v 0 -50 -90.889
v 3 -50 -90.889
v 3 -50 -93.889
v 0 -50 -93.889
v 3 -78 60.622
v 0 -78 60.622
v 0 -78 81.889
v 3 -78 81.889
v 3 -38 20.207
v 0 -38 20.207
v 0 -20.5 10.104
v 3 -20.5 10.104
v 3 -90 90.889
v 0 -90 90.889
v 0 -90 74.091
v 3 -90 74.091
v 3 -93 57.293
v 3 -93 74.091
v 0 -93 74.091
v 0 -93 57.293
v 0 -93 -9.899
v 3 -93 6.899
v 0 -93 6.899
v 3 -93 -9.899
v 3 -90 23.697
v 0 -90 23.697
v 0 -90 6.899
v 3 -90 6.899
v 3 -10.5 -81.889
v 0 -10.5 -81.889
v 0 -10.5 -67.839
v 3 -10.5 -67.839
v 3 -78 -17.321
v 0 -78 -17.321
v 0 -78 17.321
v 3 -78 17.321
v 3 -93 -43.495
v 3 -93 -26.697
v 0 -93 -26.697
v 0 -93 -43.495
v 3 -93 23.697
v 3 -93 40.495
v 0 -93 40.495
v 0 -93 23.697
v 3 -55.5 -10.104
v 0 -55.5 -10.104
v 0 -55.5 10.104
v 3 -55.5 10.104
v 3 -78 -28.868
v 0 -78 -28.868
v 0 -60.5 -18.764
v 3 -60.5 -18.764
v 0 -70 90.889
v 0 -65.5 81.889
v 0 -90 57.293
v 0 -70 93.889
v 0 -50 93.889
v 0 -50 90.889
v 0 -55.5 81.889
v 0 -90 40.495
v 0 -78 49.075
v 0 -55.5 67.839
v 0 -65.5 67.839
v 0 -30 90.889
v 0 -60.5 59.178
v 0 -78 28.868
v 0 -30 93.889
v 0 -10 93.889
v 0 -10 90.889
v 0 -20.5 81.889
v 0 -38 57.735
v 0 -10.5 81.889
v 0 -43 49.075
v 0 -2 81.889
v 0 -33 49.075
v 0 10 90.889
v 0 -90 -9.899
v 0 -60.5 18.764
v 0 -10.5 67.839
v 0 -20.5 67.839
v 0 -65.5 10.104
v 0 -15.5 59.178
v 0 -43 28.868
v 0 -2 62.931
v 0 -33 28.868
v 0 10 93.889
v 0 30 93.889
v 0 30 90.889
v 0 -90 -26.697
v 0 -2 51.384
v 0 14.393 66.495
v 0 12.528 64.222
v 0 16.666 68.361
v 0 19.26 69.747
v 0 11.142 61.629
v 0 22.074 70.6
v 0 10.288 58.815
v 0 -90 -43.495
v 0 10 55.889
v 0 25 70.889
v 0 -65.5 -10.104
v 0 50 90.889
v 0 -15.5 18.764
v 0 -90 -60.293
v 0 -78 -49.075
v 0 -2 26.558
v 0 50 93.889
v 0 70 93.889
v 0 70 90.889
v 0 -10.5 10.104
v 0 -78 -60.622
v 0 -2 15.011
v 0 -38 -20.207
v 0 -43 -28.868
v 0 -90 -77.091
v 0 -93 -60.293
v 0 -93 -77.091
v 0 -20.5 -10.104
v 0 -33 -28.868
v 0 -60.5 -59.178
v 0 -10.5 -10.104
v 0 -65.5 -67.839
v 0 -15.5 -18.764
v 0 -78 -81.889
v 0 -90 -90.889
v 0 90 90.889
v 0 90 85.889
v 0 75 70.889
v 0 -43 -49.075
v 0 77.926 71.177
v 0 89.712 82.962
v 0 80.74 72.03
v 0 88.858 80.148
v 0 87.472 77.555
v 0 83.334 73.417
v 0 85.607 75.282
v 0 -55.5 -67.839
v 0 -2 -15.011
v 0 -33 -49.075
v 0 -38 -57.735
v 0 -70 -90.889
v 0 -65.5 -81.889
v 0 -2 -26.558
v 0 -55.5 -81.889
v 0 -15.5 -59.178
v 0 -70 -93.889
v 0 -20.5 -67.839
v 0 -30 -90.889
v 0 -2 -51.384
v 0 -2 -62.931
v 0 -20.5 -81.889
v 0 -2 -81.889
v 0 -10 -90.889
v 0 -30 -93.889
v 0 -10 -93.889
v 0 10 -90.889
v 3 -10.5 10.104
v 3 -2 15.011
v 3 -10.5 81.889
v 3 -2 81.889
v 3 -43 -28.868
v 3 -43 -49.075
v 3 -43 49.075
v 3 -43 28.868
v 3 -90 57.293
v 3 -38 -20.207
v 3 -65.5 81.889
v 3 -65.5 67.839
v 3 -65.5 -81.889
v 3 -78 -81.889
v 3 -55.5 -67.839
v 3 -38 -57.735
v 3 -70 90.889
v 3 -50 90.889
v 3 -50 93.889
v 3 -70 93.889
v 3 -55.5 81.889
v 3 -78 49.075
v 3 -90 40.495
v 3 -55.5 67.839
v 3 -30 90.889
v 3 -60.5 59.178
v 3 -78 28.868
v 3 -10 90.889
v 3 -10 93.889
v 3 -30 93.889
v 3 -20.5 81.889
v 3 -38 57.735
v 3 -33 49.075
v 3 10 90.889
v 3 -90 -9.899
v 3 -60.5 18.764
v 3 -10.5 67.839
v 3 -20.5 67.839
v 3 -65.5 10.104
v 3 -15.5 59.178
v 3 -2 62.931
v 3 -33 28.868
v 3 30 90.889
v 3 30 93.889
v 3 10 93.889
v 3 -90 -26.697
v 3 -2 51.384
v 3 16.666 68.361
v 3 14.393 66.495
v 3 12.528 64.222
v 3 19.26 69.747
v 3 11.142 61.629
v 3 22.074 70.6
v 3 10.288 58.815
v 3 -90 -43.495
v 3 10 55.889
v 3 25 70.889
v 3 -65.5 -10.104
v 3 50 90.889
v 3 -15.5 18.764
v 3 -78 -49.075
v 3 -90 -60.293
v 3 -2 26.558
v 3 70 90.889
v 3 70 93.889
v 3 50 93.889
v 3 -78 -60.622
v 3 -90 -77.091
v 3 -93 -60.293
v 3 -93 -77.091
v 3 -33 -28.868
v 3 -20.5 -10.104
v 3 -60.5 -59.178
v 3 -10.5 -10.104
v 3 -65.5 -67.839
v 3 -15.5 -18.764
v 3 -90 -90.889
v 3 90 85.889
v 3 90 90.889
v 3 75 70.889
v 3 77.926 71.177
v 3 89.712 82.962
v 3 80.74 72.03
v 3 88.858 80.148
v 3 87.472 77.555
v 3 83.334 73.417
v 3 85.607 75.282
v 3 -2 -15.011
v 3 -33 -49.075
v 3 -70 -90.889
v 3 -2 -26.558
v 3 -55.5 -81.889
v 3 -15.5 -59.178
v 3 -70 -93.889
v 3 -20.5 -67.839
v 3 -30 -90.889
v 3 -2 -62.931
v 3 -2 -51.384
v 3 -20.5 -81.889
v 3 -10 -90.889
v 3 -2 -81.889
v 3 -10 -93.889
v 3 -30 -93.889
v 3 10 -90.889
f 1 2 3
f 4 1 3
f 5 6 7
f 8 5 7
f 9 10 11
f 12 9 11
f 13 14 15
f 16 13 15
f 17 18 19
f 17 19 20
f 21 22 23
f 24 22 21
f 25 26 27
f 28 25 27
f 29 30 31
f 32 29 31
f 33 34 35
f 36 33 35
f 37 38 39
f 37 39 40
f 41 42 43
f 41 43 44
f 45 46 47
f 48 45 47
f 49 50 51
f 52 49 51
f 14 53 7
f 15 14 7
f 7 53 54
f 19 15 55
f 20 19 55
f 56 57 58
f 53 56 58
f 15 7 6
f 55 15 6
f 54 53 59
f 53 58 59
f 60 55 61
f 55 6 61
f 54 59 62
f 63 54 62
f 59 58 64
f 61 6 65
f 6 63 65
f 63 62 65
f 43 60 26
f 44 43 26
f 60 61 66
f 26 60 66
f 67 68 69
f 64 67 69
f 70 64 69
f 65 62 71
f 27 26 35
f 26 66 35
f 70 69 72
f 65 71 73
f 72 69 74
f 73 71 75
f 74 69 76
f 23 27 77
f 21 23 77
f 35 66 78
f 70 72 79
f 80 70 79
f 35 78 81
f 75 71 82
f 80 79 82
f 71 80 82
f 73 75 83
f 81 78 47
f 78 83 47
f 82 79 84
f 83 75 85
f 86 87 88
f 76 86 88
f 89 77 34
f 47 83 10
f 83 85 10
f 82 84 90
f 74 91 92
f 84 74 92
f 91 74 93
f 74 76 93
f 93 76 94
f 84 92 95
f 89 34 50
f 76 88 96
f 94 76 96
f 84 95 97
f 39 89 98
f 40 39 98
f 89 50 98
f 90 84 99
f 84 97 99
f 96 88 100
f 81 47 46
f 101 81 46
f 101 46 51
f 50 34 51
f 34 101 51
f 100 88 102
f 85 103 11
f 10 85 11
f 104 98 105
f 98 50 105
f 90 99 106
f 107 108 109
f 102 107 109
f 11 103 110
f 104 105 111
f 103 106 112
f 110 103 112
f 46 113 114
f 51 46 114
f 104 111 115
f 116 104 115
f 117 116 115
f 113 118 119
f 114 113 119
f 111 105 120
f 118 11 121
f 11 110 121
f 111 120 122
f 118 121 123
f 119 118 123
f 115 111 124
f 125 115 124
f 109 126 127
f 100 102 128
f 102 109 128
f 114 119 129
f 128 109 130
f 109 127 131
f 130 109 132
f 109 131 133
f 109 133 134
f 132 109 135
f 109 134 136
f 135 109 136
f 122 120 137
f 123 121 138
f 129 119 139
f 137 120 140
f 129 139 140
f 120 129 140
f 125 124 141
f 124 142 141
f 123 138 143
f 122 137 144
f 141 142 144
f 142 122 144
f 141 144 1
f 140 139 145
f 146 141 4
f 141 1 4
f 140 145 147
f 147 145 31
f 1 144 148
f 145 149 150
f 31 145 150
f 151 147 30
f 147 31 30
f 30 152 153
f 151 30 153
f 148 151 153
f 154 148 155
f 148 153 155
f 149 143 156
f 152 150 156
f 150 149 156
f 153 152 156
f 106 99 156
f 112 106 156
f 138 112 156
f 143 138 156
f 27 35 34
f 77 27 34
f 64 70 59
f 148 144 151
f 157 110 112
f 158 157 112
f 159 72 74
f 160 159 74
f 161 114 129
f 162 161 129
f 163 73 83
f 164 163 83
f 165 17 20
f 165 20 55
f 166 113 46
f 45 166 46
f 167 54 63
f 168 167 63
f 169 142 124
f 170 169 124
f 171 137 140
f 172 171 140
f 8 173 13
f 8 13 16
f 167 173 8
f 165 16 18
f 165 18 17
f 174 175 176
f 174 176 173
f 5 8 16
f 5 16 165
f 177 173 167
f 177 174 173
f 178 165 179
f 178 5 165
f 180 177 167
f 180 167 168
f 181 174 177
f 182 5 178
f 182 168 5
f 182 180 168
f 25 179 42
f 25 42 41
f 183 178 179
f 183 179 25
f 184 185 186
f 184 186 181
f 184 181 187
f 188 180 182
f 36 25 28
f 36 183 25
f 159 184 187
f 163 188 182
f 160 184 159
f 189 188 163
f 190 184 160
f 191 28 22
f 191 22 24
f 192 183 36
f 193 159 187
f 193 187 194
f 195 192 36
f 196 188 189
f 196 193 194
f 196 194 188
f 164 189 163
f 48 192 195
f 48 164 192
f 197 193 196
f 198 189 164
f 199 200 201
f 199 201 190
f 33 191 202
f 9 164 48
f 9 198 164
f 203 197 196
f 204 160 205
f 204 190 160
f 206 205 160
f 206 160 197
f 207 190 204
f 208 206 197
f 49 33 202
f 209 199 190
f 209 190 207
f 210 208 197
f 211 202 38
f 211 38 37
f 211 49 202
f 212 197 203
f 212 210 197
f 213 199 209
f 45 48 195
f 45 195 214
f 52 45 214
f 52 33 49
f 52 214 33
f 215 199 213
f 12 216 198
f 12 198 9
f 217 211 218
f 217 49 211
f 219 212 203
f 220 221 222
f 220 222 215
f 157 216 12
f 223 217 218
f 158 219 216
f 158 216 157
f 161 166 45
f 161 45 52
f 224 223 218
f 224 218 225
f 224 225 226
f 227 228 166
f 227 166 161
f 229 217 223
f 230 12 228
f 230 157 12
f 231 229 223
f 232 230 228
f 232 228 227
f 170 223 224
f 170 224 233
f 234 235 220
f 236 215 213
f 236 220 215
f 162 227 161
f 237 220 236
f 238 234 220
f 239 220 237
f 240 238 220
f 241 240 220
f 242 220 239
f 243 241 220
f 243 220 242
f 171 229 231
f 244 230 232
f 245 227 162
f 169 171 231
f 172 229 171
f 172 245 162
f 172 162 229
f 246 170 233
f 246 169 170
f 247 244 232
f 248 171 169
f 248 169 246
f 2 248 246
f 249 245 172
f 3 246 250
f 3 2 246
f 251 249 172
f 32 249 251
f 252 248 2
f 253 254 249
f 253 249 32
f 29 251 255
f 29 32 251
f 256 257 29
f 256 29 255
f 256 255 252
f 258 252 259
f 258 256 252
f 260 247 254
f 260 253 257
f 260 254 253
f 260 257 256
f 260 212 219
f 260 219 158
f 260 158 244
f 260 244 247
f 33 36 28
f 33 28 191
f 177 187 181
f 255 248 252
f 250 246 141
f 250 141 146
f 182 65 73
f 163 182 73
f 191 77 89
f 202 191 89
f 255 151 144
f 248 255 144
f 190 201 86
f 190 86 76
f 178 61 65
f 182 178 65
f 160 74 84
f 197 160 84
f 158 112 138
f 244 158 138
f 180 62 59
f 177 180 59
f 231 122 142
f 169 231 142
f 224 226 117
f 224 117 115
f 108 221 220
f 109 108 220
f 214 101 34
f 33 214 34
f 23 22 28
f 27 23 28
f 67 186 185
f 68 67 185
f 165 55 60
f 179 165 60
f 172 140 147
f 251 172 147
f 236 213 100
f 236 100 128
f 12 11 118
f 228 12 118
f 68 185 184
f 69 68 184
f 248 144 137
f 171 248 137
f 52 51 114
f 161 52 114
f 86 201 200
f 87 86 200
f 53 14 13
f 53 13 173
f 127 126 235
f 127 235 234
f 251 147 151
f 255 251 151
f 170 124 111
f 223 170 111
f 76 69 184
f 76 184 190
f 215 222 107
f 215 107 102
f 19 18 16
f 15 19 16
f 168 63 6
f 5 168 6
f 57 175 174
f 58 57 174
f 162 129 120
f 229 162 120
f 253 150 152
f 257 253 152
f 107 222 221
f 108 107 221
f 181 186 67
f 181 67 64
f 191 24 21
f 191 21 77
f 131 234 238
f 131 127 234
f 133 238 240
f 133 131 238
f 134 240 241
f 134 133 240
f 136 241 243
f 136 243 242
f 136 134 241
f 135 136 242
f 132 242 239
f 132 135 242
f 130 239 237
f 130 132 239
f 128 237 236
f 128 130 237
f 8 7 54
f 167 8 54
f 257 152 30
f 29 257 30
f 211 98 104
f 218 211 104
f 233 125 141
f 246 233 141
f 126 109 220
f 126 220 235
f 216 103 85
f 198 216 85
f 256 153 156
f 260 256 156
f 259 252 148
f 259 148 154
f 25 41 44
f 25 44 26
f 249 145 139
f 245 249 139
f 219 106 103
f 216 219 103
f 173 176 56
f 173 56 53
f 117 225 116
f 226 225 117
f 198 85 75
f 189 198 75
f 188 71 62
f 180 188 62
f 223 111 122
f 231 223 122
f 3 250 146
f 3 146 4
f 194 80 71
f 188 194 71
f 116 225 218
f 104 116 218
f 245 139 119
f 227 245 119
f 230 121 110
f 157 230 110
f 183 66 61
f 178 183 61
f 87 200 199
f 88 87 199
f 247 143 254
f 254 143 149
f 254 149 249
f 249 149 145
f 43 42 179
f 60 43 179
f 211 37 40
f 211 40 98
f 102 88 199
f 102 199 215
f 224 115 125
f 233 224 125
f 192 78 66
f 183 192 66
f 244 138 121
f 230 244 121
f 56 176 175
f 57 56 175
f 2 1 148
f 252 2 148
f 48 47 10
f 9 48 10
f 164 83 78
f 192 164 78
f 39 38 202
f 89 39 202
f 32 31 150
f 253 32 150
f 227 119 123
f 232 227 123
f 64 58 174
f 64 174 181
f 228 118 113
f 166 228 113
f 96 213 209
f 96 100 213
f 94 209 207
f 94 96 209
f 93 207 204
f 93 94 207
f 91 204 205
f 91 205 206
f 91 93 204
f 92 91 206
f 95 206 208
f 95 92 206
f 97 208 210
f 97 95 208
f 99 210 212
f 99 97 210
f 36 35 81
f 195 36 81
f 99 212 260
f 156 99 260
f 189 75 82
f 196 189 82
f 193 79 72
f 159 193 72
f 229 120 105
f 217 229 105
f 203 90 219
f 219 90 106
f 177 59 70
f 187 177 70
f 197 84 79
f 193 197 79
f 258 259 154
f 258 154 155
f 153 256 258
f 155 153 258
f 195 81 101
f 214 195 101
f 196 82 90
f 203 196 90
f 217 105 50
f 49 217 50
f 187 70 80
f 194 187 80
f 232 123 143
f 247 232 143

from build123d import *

# Parameters (mm, degrees)
SKETCH1_W               = 181.7773
SKETCH1_H               = 180
BOSS_EXTRUDE1_DEPTH     = 3
SKETCH2_W               = 16.797936363
SKETCH2_H               = 3
SKETCH2_W_2             = 16.797936364
SKETCH2_W_3             = 3
SKETCH2_H_2             = 20
BOSS_EXTRUDE2_DEPTH     = 3
SKETCH3_W               = 164.7773
SKETCH3_H               = 80
CUT_EXTRUDE1_DEPTH      = 1
CUT_EXTRUDE1_DEPTH_BACK = 4
FILLET1_R               = 15
CUT_EXTRUDE2_DEPTH      = 10


with BuildPart() as part:
    # Sketch1 → Boss-Extrude1 (new body)
    with BuildSketch(Plane(origin=(0, 0, 0), x_dir=(0, 0, -1), z_dir=(1, 0, 0))):
        Rectangle(SKETCH1_W, SKETCH1_H)
    extrude(amount=BOSS_EXTRUDE1_DEPTH)

    # Sketch2 → Boss-Extrude2 (add)
    with BuildSketch(Plane(origin=(3, 0, 0), x_dir=(0, 0, -1), z_dir=(1, 0, 0))):
        with Locations((-65.691745455, -91.5)):
            Rectangle(SKETCH2_W, SKETCH2_H)
        with Locations((-32.095872727, -91.5)):
            Rectangle(SKETCH2_W_2, SKETCH2_H)
        with Locations((1.5, -91.5)):
            Rectangle(SKETCH2_W_2, SKETCH2_H)
        with Locations((92.38865, -60)):
            Rectangle(SKETCH2_W_3, SKETCH2_H_2)
        with Locations((92.38865, -20)):
            Rectangle(SKETCH2_W_3, SKETCH2_H_2)
        with Locations((92.38865, 20)):
            Rectangle(SKETCH2_W_3, SKETCH2_H_2)
        with Locations((92.38865, 60)):
            Rectangle(SKETCH2_W_3, SKETCH2_H_2)
        with Locations((-92.38865, -60)):
            Rectangle(SKETCH2_W_3, SKETCH2_H_2)
        with Locations((-92.38865, -20)):
            Rectangle(SKETCH2_W_3, SKETCH2_H_2)
        with Locations((-92.38865, 20)):
            Rectangle(SKETCH2_W_3, SKETCH2_H_2)
        with Locations((-92.38865, 60)):
            Rectangle(SKETCH2_W_3, SKETCH2_H_2)
        with Locations((35.095872727, -91.5)):
            Rectangle(SKETCH2_W_2, SKETCH2_H)
        with Locations((68.691745455, -91.5)):
            Rectangle(SKETCH2_W, SKETCH2_H)
    extrude(amount=-BOSS_EXTRUDE2_DEPTH)

    # Sketch3 → Cut-Extrude1 (cut, two sides)
    with BuildSketch(Plane(origin=(3, 0, 0), x_dir=(0, 0, -1), z_dir=(1, 0, 0))) as cut_extrude1_sk:
        with Locations((11.5, 50)):
            Rectangle(SKETCH3_W, SKETCH3_H)
    extrude(amount=CUT_EXTRUDE1_DEPTH, mode=Mode.SUBTRACT)
    extrude(cut_extrude1_sk.sketch, amount=-CUT_EXTRUDE1_DEPTH_BACK, mode=Mode.SUBTRACT)

    # Fillet1
    fillet1_edges = [part.edges().sort_by_distance(p)[0] for p in [
        (1.5, 10, 70.88865),
        (1.5, 90, 70.88865),
    ]]
    fillet(fillet1_edges, radius=FILLET1_R)

    # Sketch4 → Cut-Extrude2 (cut)
    with BuildSketch(Plane.ZY):
        Polygon((-67.83865663, -65.5), (-81.88865, -65.5), (-81.88865, -78), (-60.621778265, -78), align=None)
        Polygon((-49.074772881, -43), (-59.178402592, -60.5), (-49.074772881, -78), (-28.867513459, -78), (-18.763883749, -60.5), (-28.867513459, -43), align=None)
        Polygon((-10.103629711, -65.5), (-17.320508076, -78), (17.320508076, -78), (10.103629711, -65.5), align=None)
        Polygon((28.867513459, -43), (18.763883749, -60.5), (28.867513459, -78), (49.074772881, -78), (59.178402592, -60.5), (49.074772881, -43), align=None)
        Polygon((81.88865, -78), (81.88865, -65.5), (67.83865663, -65.5), (60.621778265, -78), align=None)
        Polygon((81.88865, -55.5), (81.88865, -20.5), (67.83865663, -20.5), (57.735026919, -38), (67.83865663, -55.5), align=None)
        Polygon((51.384173958, -2), (26.558112383, -2), (18.763883749, -15.5), (28.867513459, -33), (49.074772881, -33), (59.178402592, -15.5), align=None)
        Polygon((81.88865, -10.5), (81.88865, -2), (62.931179342, -2), (67.83865663, -10.5), align=None)
        Polygon((20.207259422, -38), (10.103629711, -20.5), (-10.103629711, -20.5), (-20.207259422, -38), (-10.103629711, -55.5), (10.103629711, -55.5), align=None)
        Polygon((15.011106999, -2), (-15.011106999, -2), (-10.103629711, -10.5), (10.103629711, -10.5), align=None)
        Polygon((-26.558112383, -2), (-51.384173958, -2), (-59.178402592, -15.5), (-49.074772881, -33), (-28.867513459, -33), (-18.763883749, -15.5), align=None)
        Polygon((-67.83865663, -20.5), (-81.88865, -20.5), (-81.88865, -55.5), (-67.83865663, -55.5), (-57.735026919, -38), align=None)
        Polygon((-62.931179342, -2), (-81.88865, -2), (-81.88865, -10.5), (-67.83865663, -10.5), align=None)
    extrude(amount=-CUT_EXTRUDE2_DEPTH, mode=Mode.SUBTRACT)


solid = part.part
